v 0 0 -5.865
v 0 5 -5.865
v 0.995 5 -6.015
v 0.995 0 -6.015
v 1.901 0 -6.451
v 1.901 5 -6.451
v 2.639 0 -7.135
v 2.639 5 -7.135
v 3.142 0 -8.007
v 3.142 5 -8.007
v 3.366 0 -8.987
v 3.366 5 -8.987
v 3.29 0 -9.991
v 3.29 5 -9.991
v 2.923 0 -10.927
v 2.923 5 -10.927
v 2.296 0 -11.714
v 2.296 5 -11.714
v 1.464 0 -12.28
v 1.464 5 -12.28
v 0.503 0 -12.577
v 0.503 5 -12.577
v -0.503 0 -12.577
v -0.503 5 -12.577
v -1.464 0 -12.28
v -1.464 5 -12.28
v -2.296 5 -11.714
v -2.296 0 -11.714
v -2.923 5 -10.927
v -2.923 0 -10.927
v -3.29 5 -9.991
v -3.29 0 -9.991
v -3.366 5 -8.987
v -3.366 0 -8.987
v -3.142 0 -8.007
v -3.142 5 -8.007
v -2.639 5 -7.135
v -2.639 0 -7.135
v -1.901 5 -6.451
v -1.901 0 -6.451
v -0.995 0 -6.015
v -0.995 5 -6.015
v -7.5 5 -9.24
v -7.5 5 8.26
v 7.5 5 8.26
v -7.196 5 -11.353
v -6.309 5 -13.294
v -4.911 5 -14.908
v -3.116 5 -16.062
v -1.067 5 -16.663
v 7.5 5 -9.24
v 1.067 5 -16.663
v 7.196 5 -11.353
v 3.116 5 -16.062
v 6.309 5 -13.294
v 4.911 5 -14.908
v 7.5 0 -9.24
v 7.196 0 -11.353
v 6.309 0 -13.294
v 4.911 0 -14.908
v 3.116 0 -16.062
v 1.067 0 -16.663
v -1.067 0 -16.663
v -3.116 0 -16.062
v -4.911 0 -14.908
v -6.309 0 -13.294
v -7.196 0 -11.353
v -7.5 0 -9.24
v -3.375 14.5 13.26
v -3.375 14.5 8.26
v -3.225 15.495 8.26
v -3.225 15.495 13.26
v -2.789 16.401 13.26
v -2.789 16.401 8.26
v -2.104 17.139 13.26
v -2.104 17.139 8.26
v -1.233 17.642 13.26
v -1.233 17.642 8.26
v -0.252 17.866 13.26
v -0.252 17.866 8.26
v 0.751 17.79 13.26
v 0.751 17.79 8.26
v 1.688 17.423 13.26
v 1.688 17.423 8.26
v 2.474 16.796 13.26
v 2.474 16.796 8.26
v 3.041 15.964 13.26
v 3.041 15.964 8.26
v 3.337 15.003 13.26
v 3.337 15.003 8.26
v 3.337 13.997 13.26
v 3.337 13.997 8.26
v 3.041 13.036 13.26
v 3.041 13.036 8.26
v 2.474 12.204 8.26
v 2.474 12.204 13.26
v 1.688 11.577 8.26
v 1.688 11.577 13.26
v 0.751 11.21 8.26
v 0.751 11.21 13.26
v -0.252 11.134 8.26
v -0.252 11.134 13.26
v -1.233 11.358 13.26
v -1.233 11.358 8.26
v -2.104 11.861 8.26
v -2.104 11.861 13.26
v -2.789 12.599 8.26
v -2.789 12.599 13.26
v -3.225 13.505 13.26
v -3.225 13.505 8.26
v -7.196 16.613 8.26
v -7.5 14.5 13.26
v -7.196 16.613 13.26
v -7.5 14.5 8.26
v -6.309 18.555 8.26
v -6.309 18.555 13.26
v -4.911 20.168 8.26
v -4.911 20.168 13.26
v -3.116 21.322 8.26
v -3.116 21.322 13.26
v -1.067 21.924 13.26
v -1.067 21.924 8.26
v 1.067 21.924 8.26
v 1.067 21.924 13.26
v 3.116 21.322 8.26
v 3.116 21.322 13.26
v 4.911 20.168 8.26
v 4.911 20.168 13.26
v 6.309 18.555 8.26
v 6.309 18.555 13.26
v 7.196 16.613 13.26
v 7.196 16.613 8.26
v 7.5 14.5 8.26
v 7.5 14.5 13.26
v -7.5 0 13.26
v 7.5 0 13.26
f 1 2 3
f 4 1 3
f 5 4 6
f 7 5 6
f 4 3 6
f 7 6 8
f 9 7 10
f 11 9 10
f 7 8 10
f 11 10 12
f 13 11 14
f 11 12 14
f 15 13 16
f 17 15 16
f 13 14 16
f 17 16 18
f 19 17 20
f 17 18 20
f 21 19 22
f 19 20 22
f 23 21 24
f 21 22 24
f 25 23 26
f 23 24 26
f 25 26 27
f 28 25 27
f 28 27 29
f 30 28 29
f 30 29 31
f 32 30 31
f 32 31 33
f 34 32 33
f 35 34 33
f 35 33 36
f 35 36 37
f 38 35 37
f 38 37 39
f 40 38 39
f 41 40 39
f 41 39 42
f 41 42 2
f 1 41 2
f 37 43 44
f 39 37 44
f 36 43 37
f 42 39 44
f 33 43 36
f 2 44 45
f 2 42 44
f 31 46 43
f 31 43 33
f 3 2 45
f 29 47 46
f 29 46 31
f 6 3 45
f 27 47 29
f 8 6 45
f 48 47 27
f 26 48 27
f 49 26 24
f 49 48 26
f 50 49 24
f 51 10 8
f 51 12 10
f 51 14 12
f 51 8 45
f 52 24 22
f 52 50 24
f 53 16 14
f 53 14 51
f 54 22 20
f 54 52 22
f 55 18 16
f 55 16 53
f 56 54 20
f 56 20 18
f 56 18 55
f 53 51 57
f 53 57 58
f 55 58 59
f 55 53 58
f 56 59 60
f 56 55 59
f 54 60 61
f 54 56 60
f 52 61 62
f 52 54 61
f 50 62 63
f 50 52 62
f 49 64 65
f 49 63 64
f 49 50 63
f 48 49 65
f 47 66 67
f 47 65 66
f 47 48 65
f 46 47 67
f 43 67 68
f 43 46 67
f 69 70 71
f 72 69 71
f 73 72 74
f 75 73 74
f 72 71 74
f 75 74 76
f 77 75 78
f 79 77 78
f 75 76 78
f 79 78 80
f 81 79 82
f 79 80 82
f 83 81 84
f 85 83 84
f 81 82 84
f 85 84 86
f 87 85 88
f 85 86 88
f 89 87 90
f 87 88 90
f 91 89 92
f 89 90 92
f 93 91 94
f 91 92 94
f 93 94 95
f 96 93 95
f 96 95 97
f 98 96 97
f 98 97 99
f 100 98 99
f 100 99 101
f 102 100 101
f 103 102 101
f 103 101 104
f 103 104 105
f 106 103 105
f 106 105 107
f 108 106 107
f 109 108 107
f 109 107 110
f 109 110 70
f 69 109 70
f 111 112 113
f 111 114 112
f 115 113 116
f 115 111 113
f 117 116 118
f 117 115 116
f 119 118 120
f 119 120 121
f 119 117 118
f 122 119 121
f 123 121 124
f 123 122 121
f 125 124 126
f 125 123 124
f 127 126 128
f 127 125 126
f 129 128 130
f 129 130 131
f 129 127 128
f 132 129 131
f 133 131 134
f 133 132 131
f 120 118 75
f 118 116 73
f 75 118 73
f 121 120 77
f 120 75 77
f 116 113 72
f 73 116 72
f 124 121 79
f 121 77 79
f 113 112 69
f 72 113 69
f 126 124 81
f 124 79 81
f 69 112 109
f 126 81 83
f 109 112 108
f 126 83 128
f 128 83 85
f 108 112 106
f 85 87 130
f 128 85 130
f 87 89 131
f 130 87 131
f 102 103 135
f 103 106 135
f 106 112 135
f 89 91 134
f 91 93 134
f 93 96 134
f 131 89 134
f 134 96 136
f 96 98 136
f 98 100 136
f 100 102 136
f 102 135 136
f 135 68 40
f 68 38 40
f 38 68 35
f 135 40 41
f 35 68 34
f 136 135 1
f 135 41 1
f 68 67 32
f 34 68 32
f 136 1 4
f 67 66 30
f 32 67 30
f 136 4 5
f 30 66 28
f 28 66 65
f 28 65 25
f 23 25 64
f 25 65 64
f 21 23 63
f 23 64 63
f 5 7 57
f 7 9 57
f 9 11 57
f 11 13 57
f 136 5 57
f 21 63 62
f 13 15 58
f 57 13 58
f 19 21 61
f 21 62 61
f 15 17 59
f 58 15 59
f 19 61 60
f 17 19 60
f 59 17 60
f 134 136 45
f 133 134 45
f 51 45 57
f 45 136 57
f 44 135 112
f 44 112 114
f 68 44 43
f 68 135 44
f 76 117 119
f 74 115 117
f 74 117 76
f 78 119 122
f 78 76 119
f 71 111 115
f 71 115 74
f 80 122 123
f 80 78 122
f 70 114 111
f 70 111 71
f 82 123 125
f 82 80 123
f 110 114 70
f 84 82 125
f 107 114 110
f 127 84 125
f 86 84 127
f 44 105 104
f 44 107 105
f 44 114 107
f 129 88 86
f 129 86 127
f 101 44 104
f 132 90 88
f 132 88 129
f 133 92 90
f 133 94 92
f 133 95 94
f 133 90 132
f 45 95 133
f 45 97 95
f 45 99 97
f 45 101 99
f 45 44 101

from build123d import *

# Parameters (mm, degrees)
ESQUISSE1_W             = 15
ESQUISSE1_H             = 30
BOSS_EXTRU_1_DEPTH      = 5
ESQUISSE2_W             = 15
ESQUISSE2_H             = 5
BOSS_EXTRU_2_DEPTH      = 17
CONG_1_RADIUS           = 7.5
CONG_1_LENGTH           = 5
CONG_3_RADIUS           = 7.5
CONG_3_LENGTH           = 5
ESQUISSE3_R             = 3.375
ENL_V_MAT_EXTRU_1_DEPTH = 10
ESQUISSE4_R             = 3.375
ENL_V_MAT_EXTRU_2_DEPTH = 10


with BuildPart() as part:
    # Esquisse1 → Boss.-Extru.1 (new body)
    with BuildSketch(Plane(origin=(0, 0, 0), x_dir=(1, 0, 0), z_dir=(0, 1, 0))):
        with Locations((0, 1.739690722)):
            Rectangle(ESQUISSE1_W, ESQUISSE1_H)
    extrude(amount=BOSS_EXTRU_1_DEPTH)

    # Esquisse2 → Boss.-Extru.2 (add)
    with BuildSketch(Plane(origin=(0, 5, 0), x_dir=(1, 0, 0), z_dir=(0, 1, 0))):
        with Locations((0, -10.760309278)):
            Rectangle(ESQUISSE2_W, ESQUISSE2_H)
    extrude(amount=BOSS_EXTRU_2_DEPTH)

    # Congé1: full round fillet: the end face becomes a half cylinder, R = half its width
    cong_1_face = Plane((0, 2.5, -16.739690722), x_dir=(0, 1, 0), z_dir=(0, 0, -1))  # on the end face: x along it, z out of the body
    cong_1_slab = cong_1_face.offset(-CONG_1_RADIUS / 2) * Box(CONG_1_LENGTH, 2 * CONG_1_RADIUS, CONG_1_RADIUS, mode=Mode.PRIVATE)  # the body's end, R deep
    cong_1_round = Plane((0, 2.5, -9.239690722), x_dir=(0, 0, -1), z_dir=(0, 1, 0)) * Cylinder(CONG_1_RADIUS, CONG_1_LENGTH, mode=Mode.PRIVATE)  # its axis R under the face
    add(cong_1_slab - cong_1_round, mode=Mode.SUBTRACT)

    # Congé3: full round fillet: the end face becomes a half cylinder, R = half its width
    cong_3_face = Plane((0, 22, 10.760309278), x_dir=(0, 0, -1), z_dir=(0, 1, 0))  # on the end face: x along it, z out of the body
    cong_3_slab = cong_3_face.offset(-CONG_3_RADIUS / 2) * Box(CONG_3_LENGTH, 2 * CONG_3_RADIUS, CONG_3_RADIUS, mode=Mode.PRIVATE)  # the body's end, R deep
    cong_3_round = Plane((0, 14.5, 10.760309278), x_dir=(0, 1, 0), z_dir=(0, 0, -1)) * Cylinder(CONG_3_RADIUS, CONG_3_LENGTH, mode=Mode.PRIVATE)  # its axis R under the face
    add(cong_3_slab - cong_3_round, mode=Mode.SUBTRACT)

    # Esquisse3 → Enlèv. mat.-Extru.1 (cut)
    with BuildSketch(Plane(origin=(0, 5, 0), x_dir=(1, 0, 0), z_dir=(0, 1, 0))):
        with Locations(Location((0, 9.239690722, 0), (0, 0, 270))):
            Circle(ESQUISSE3_R)
    extrude(amount=-ENL_V_MAT_EXTRU_1_DEPTH, mode=Mode.SUBTRACT)

    # Esquisse4 → Enlèv. mat.-Extru.2 (cut)
    with BuildSketch(Plane(origin=(0, 0, 8.260309278), x_dir=(-1, 0, 0), z_dir=(0, 0, -1))):
        with Locations((0, 14.5)):
            Circle(ESQUISSE4_R)
    extrude(amount=-ENL_V_MAT_EXTRU_2_DEPTH, mode=Mode.SUBTRACT)


solid = part.part
